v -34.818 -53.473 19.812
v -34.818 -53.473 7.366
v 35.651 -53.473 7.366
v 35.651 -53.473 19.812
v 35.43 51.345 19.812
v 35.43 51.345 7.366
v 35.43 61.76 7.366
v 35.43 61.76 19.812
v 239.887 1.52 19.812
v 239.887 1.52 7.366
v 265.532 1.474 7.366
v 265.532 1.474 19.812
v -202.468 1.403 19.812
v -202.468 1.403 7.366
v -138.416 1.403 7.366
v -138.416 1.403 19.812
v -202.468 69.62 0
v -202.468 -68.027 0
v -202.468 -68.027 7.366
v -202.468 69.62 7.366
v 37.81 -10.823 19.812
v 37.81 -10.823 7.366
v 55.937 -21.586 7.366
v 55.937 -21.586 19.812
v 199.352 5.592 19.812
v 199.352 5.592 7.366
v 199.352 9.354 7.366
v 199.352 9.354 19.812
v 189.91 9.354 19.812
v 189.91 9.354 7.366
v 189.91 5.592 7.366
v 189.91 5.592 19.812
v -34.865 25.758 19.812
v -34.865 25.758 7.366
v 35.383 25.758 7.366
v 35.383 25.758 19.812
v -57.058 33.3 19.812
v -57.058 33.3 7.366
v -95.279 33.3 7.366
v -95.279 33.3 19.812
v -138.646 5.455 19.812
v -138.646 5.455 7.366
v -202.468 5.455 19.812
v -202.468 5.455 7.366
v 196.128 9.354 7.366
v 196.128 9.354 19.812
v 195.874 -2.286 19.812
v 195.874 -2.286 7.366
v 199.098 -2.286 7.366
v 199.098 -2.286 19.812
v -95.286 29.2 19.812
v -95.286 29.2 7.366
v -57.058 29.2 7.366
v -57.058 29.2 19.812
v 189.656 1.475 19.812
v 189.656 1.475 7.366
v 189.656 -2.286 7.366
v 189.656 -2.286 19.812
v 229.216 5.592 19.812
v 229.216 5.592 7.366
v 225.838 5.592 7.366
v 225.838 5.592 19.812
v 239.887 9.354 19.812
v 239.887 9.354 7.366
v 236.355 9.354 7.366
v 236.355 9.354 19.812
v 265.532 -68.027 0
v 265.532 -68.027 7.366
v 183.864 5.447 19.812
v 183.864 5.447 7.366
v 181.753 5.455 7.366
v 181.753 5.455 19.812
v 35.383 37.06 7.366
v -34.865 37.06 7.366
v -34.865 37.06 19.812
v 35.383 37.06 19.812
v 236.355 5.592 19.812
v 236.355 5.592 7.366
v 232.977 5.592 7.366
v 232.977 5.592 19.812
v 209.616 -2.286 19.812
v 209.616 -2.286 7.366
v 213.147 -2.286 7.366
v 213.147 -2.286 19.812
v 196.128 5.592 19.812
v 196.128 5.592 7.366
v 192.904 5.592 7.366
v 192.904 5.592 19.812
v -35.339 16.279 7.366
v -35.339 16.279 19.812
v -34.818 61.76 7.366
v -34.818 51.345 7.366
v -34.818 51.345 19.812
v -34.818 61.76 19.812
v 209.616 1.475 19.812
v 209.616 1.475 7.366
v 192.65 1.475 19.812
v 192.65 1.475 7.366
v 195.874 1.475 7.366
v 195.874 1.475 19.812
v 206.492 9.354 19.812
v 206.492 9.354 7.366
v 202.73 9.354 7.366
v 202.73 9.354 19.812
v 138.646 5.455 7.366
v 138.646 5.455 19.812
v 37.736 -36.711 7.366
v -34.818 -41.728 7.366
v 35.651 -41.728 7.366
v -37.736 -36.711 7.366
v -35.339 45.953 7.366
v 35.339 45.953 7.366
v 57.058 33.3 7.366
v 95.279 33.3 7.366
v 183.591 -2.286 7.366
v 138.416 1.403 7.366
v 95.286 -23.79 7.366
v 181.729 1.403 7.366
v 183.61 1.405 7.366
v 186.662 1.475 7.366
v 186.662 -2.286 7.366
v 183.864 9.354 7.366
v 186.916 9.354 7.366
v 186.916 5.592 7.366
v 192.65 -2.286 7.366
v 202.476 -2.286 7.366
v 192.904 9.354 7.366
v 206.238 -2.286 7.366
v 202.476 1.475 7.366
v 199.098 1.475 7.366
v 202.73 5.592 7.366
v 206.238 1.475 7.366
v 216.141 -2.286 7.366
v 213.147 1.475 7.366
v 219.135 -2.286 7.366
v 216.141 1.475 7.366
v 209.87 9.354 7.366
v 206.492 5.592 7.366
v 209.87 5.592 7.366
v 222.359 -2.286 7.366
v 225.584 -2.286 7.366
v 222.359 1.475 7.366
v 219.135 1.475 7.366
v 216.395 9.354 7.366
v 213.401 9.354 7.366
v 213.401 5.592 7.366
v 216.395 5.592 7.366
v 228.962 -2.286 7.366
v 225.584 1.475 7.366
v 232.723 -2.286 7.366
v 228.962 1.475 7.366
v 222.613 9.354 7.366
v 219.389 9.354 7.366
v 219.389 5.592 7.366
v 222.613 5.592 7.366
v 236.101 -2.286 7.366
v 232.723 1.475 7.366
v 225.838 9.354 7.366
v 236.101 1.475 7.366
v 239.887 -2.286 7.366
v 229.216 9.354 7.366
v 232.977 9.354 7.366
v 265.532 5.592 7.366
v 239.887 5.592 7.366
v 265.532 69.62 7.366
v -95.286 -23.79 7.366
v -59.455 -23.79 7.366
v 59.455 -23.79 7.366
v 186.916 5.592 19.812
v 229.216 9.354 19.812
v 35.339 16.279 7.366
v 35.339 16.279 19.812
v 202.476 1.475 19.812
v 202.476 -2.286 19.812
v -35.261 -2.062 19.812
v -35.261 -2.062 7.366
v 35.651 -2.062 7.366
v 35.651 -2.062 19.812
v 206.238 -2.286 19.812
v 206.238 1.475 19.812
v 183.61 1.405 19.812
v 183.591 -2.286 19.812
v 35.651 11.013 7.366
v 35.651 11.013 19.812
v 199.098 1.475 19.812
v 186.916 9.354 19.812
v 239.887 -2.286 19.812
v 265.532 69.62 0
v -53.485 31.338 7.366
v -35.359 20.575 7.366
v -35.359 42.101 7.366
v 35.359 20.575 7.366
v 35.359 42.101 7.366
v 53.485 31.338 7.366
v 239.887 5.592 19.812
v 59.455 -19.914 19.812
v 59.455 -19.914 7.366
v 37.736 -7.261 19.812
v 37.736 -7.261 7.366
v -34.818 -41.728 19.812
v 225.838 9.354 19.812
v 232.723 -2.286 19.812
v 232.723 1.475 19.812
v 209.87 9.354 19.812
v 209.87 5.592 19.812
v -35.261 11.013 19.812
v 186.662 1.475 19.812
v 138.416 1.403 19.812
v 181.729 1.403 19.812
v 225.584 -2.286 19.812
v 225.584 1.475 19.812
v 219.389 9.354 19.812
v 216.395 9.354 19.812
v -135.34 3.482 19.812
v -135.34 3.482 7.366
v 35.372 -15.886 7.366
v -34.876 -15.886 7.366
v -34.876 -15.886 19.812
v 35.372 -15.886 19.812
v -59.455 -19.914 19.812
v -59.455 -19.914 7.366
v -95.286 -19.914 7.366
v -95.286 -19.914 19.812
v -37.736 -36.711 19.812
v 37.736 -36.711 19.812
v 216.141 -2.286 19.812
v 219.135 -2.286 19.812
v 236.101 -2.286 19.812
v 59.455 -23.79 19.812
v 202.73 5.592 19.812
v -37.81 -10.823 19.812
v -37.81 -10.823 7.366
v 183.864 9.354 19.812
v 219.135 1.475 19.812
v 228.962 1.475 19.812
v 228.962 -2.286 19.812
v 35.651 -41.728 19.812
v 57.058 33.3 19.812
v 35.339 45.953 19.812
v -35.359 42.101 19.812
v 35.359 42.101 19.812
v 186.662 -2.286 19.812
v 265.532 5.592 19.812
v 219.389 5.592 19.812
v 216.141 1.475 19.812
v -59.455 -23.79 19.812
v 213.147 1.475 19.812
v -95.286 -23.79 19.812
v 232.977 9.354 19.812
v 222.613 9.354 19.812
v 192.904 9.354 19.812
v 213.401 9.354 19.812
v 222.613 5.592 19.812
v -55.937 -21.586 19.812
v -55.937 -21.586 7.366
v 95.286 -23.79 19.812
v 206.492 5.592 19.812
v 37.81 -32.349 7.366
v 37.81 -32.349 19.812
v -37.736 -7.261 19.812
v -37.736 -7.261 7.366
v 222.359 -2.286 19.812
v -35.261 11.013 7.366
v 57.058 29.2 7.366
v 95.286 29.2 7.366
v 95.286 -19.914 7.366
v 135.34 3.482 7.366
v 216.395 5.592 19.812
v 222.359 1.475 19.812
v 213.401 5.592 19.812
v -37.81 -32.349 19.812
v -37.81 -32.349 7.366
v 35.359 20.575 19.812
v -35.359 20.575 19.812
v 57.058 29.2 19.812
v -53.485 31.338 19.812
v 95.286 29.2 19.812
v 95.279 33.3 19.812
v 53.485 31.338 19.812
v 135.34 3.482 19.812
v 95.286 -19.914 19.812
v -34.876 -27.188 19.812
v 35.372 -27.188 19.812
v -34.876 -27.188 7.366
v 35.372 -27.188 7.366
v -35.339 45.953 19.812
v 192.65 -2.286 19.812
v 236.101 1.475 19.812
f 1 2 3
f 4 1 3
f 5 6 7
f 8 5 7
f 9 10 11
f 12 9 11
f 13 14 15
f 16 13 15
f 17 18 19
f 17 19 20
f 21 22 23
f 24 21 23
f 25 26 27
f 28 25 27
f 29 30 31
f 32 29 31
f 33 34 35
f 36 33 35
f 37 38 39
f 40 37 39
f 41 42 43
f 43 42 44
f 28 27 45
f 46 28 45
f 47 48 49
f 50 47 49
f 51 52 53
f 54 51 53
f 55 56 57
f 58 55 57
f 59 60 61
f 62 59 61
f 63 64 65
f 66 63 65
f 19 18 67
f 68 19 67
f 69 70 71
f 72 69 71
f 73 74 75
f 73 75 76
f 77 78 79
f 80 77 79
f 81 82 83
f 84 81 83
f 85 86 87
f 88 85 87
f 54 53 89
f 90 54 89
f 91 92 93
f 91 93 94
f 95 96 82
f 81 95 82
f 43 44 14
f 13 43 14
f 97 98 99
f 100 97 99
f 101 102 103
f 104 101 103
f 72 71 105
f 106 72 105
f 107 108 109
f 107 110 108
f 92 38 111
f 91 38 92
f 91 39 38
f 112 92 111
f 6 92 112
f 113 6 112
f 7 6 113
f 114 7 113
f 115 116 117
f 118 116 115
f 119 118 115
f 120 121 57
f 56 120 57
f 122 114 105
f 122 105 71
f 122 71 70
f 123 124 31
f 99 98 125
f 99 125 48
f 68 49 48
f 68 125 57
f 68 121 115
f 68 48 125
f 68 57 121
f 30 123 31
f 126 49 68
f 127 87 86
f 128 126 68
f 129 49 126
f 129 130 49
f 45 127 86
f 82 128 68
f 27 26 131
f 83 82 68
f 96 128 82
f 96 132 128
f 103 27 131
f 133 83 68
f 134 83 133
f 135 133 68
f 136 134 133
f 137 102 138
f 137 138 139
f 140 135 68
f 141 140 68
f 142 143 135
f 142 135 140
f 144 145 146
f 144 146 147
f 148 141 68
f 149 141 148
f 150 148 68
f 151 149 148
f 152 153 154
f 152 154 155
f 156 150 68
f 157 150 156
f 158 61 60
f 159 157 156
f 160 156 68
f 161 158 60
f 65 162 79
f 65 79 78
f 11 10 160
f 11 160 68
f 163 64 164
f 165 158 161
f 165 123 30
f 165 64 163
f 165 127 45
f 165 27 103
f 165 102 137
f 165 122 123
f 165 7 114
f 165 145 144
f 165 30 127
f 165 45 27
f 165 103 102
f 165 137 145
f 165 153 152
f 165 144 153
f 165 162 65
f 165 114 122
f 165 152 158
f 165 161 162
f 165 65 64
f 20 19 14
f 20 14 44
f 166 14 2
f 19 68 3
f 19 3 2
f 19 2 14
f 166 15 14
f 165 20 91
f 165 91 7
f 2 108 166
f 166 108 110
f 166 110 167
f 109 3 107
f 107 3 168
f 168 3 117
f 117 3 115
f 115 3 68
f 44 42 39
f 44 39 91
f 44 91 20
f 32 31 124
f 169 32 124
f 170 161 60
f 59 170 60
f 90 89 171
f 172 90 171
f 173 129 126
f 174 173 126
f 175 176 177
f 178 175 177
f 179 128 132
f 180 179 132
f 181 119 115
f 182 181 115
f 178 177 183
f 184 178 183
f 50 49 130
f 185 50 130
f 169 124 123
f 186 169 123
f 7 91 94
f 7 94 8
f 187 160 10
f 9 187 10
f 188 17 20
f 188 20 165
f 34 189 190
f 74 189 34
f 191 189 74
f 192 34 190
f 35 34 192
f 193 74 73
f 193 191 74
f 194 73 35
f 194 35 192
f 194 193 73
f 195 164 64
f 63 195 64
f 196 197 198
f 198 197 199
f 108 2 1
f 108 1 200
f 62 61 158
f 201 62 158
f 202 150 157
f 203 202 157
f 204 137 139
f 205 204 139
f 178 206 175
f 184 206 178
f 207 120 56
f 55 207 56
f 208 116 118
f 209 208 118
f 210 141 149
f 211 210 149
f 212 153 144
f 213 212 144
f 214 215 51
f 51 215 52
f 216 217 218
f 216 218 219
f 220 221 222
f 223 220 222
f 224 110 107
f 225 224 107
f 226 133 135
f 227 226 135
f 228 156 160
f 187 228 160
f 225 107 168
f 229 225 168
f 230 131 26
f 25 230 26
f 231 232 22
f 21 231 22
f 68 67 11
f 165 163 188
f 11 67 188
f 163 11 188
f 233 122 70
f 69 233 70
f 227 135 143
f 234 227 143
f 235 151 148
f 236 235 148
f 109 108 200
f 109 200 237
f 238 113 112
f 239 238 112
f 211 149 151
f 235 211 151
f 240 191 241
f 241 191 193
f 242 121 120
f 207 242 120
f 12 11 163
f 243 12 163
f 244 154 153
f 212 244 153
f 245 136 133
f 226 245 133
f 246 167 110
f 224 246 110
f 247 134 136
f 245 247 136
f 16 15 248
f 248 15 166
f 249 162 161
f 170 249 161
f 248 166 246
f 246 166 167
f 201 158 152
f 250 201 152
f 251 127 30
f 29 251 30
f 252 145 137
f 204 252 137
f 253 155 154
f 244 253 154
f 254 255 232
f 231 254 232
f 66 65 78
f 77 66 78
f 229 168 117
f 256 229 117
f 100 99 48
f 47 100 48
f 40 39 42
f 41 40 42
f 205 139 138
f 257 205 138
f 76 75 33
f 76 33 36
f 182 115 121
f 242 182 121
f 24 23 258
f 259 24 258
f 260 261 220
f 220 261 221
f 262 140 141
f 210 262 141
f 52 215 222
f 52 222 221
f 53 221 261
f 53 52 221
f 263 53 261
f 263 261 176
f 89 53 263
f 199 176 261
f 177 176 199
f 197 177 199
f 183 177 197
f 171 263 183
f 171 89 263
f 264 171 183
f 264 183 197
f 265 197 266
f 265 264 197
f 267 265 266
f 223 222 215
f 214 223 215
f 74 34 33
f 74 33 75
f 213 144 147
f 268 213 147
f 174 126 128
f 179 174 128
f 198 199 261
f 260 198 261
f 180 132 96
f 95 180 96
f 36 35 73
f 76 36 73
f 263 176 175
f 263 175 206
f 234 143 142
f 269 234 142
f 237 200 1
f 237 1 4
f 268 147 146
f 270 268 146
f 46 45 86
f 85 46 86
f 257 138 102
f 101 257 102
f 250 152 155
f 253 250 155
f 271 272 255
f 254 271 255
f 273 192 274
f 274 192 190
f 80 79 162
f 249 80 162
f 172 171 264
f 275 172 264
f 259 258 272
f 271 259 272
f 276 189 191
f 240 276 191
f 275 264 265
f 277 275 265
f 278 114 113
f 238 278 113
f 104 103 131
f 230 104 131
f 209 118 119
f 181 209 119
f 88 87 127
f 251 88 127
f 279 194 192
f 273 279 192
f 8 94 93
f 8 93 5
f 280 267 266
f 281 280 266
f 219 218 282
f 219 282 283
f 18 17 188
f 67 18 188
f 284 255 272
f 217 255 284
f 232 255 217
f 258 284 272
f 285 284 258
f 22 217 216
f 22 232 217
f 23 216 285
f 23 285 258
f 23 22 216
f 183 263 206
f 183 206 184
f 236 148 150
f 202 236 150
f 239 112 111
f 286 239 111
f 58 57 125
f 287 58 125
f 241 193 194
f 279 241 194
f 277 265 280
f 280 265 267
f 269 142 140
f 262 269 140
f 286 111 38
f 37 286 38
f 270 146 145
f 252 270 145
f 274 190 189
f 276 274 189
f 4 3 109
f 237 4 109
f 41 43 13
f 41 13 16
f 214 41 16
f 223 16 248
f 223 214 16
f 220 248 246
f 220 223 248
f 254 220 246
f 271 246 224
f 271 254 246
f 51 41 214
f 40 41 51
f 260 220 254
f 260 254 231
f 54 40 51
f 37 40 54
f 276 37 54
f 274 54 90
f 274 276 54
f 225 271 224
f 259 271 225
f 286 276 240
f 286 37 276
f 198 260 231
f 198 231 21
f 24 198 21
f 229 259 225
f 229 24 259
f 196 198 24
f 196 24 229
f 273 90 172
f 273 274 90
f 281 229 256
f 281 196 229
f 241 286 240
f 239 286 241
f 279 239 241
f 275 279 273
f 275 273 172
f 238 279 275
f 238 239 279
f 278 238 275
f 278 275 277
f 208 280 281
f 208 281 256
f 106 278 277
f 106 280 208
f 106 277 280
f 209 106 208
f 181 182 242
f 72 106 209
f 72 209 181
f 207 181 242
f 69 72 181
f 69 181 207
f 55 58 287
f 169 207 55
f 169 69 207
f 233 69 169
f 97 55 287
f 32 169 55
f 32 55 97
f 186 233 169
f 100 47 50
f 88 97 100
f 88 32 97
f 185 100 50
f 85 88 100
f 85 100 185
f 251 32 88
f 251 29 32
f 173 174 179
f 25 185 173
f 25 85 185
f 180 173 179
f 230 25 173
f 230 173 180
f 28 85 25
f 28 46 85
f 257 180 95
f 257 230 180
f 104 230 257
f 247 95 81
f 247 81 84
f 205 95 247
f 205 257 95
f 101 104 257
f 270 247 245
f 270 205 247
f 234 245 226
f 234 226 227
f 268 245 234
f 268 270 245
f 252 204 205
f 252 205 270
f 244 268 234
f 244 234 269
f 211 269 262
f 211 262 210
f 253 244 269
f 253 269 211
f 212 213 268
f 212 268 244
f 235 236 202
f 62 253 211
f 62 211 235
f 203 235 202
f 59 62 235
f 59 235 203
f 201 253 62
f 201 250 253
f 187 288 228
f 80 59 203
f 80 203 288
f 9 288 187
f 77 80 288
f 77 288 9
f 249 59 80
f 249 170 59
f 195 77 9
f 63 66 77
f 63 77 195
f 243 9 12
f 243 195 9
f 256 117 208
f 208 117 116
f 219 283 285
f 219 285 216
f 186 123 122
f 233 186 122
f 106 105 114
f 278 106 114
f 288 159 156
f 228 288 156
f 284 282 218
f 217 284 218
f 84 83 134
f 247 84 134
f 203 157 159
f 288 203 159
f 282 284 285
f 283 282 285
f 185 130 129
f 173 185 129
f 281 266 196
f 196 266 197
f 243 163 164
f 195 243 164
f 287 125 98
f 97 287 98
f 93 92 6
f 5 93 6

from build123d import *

# Parameters (mm, degrees)
F0_W     = 468.000487
F0_H     = 137.646742
F1_DEPTH = 7.366
F2_W     = 70.247736
F2_H     = 10.415282
F2_W_2   = 70.469331
F2_H_2   = 11.744887
F2_H_3   = 11.301685
F2_W_3   = 70.91254
F2_H_4   = 13.074499
F3_DEPTH = 12.446


with BuildPart() as f1:
    # F0 (on Top) → F1 (new body)
    with BuildSketch(Plane.XY):
        with Locations((31.531855, 0.796761)):
            Rectangle(F0_W, F0_H)
    extrude(amount=F1_DEPTH)

    # F2 (on face) → F3 (join)
    with BuildSketch(Plane.XY.offset(7.366)):
        Polygon((-138.646447, 5.454973), (-156.350389, 5.454973), (-202.468388, 5.454973), (-202.468388, 1.403027), (-156.604389, 1.403027), (-138.416419, 1.403027), (-95.286213, -23.789594), (-59.45519, -23.789594), (-37.736211, -36.710622), (0, -36.710622), (37.736211, -36.710622), (59.45519, -23.789594), (95.286213, -23.789594), (138.416419, 1.403027), (156.604389, 1.403027), (181.72892, 1.403027), (183.610221, 1.405067), (183.59076, -2.286332), (186.661547, -2.286332), (186.661547, 1.475384), (189.655577, 1.475384), (189.655577, -2.286332), (192.649593, -2.286332), (192.649593, 1.475384), (195.873921, 1.475384), (195.873921, -2.286332), (199.09825, -2.286332), (199.09825, 1.475384), (202.476119, 1.475384), (202.476119, -2.286332), (206.237828, -2.286332), (206.237828, 1.475384), (209.615698, 1.475384), (209.615698, -2.286332), (213.147109, -2.286332), (213.147109, 1.475384), (216.14114, 1.475384), (216.14114, -2.286332), (219.135156, -2.286332), (219.135156, 1.475384), (222.359484, 1.475384), (222.359484, -2.286332), (225.583812, -2.286332), (225.583812, 1.475384), (228.961682, 1.475384), (228.961682, -2.286332), (232.72339, -2.286332), (232.72339, 1.475384), (236.10126, 1.475384), (236.10126, -2.286332), (239.886671, -2.286332), (239.886671, 1.519807), (265.532099, 1.473806), (265.532099, 5.592193), (239.886671, 5.592193), (239.886671, 9.353909), (236.35526, 9.353909), (236.35526, 5.592193), (232.97739, 5.592193), (232.97739, 9.353909), (229.215682, 9.353909), (229.215682, 5.592193), (225.837812, 5.592193), (225.837812, 9.353909), (222.613484, 9.353909), (222.613484, 5.592193), (219.389156, 5.592193), (219.389156, 9.353909), (216.39514, 9.353909), (216.39514, 5.592193), (213.401109, 5.592193), (213.401109, 9.353909), (209.869698, 9.353909), (209.869698, 5.592193), (206.491828, 5.592193), (206.491828, 9.353909), (202.730119, 9.353909), (202.730119, 5.592193), (199.35225, 5.592193), (199.35225, 9.353909), (196.127921, 9.353909), (196.127921, 5.592193), (192.903593, 5.592193), (192.903593, 9.353909), (189.909577, 9.353909), (189.909577, 5.592193), (186.915547, 5.592193), (186.915547, 9.353909), (183.864221, 9.353909), (183.864221, 5.446596), (181.752861, 5.454973), (156.350389, 5.454973), (138.646447, 5.454973), (95.279287, 33.300258), (57.058044, 33.300258), (35.339065, 45.953158), (0, 45.953158), (-35.339065, 45.953158), (-57.058044, 33.300258), (-95.279287, 33.300258), align=None)
        Polygon((-37.810078, -32.348648), (-55.936935, -21.585828), (-37.810078, -10.823006), (0, -10.823006), (37.810078, -10.823006), (55.936935, -21.585828), (37.810078, -32.348648), (0, -32.348648), align=None, mode=Mode.SUBTRACT)
        Polygon((-135.340132, 3.482032), (-95.286213, 29.199943), (-57.058044, 29.199943), (-35.339065, 16.278915), (0, 16.278915), (35.339065, 16.278915), (57.058044, 29.199943), (95.286213, 29.199943), (135.340132, 3.482032), (95.286213, -19.91371), (59.45519, -19.91371), (37.736211, -7.260809), (0, -7.260809), (-37.736211, -7.260809), (-59.45519, -19.91371), (-95.286213, -19.91371), align=None, mode=Mode.SUBTRACT)
        Polygon((-35.358623, 20.574907), (-53.485479, 31.337727), (-35.358623, 42.100549), (0, 42.100549), (35.358623, 42.100549), (53.485479, 31.337727), (35.358623, 20.574907), (0, 20.574907), align=None, mode=Mode.SUBTRACT)
        with Locations((0.305964, 56.552144)):
            Rectangle(F2_W, F2_H)
        with Locations((0.416769, -47.60065)):
            Rectangle(F2_W_2, F2_H_2)
        with Locations((0.259081, 31.408699)):
            Rectangle(F2_W, F2_H_3)
        with Locations((0.195164, 4.475746)):
            Rectangle(F2_W_3, F2_H_4)
        with Locations((0.247676, -21.536928)):
            Rectangle(F2_W, F2_H_3)
    extrude(amount=F3_DEPTH)


solid = f1.part
